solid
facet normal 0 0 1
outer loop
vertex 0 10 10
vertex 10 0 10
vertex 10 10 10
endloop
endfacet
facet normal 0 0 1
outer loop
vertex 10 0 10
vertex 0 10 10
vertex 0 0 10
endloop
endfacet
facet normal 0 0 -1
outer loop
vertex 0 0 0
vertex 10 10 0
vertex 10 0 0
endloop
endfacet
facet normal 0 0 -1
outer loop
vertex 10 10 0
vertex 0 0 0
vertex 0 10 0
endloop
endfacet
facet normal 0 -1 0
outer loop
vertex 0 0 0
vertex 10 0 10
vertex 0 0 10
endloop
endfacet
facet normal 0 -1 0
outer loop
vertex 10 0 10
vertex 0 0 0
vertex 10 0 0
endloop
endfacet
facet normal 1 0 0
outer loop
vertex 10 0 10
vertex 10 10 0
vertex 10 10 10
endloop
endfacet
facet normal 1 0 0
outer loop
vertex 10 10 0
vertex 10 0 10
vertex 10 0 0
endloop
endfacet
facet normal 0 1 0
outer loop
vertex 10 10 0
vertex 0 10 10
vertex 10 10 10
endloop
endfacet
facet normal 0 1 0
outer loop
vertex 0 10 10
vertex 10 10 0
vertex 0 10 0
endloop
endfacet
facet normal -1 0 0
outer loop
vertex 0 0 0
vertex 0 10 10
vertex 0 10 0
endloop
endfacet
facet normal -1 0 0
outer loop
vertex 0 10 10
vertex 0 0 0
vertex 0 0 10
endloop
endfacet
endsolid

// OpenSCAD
// file: ../Household/references.scad
// Size
//Naming
// _PT = printable
// _ES = exact size
// _IS = insertable with force but no gaps

//--------------cables  (CB)

//----Ethernet (rj45)

//not mesured yet
CB_RJ45_Diameter_ES=4; 

//--------------threaded rod  (TR)

//----M5

TR_M5_Diameter_ES = 5.8;
//for a hole 
TR_M5_Diamater_IS = 6;
TR_M5_Diamater_PT = 7;


//----M10

TR_M10_Diameter_ES = 9.6;
//for a hole 
TR_M10_Diamater_IS = 10;
TR_M10_Diamater_PT = 12;

//--------------Screw (SC)
//----M3

module body_M3(height_input){
    cylinder(d=SC_M3_Diameter_PT,h=height_input,$fn=60);
    
    }

module body_M5(height_input){
    cylinder(d=SC_M5_Diameter_PT,h=height_input,$fn=60);
    
    }
    
SC_M3_Diameter_ES = 2.96;
SC_M3_Head_Diameter_ES = 5.90;
SC_M3_Head_Height_ES = 2.32;
//for a hole 
SC_M3_Diameter_PT = 4; 


//----M5

SC_M5_Diameter_ES = 4.86;
SC_M5_Head_Diameter_ES = 9.24;
SC_M5_Head_Height_ES = 3.0;
//for a hole 
SC_M5_Diameter_IS = 5;
SC_M5_Diameter_PT = 5.2; //inconnu pour le moment
SC_M5_Head_Diameter_PT = 11;

//--------------Nut Bolt (NB)

module nut_M3(height_input){
    cylinder(d=NB_M3_Diameter_C2C_PT,h=height_input,$fn=6);
    
    }

//----M3
// Side to side = from 2 paralelle faces S2S
// corner to corner = from 2 corners C2C


NB_M3_Diameter_S2S_ES = 5.30;
NB_M3_Diameter_C2C_ES = 6.0;

NB_M3_Diameter_S2S_PT = 6.30; //reducing as well
NB_M3_Diameter_C2C_PT = 7.0; //8.0 was too much 


//--------------Zip ties (ZT)

//Big zip ties I got    

ZT_length_ES = 300;
ZT_width_ES = 4.8;
ZT_height_ES = 1;

ZT_width_PT = 7;
ZT_height_PT = 3;

//--------------Velcro tape (VT)



VT_length_ES = 300;
VT_width_ES = 20;
VT_height_ES = 1;

VT_width_PT = 22;
VT_height_PT = 3;



//--------------Switch (SW)
//switch from castorama 
SW_length_ES = 13;
SW_width_ES = 8;
SW_height_ES = 14;

SW_length_PT = 15;
SW_width_PT = 10;
SW_height_PT = 16;


//switch from aliexpress
SW_AL_tube_width_ES = 5.7;
SW_AL_tube_width_PT = 7;

module custom_cylinder_switch(translated_position_X, translated_position_Y,translated_position_Z,heigh_input) {
    translate([translated_position_X, translated_position_Y, translated_position_Z]){ 
        rotate([90,0,0]){
            cylinder(d=SW_AL_tube_width_PT, h=heigh_input, $fn=30);
        }
    }
}
module custom_cylinder(rotate_input,translate_input,diameter_object,height_object){
    translate(translate_input){
        rotate(rotate_input){
            cylinder(d=diameter_object,h=height_object,$fn=60);
        }
    }
}

//--------------generic connectors (GC)
// USB C (USB-C)
GC_USB_C_length_ES = 7.3;
GC_USB_C_width_ES = 8.8;
GC_USB_C_height_ES = 3;

module USB_C(rotate_input,translate_input){
    translate(translate_input){
    rotate(rotate_input){
        hull(){
    cylinder(d=GC_USB_C_height_ES,h=GC_USB_C_length_ES,$fn=60);
translate([0,GC_USB_C_width_ES-GC_USB_C_height_ES,0]){
    cylinder(d=GC_USB_C_height_ES,h=GC_USB_C_length_ES,$fn=60);
}
}
    }
}
}

//--------------battery from vapes (BV)

//vapes crystal pro battery (CP)
BV_CP_length_ES = 34;
BV_CP_width_ES = 20;
BV_CP_height_ES = BV_CP_width_ES; //(because it's a cylinder)

BV_CP_length_PT = 37;
BV_CP_width_PT = 22;
BV_CP_height_PT = BV_CP_width_ES; //(because it's a cylinder)

//dimension list [legnth, width, height]
//BV_CP_PT=[37,22,22];
BV_CP_PT=[BV_CP_length_PT,BV_CP_width_PT,BV_CP_height_PT];

module vapes_battery(input_list,rotate_input,translate_input){
translate(translate_input){
    rotate(rotate_input){
        color("green")cylinder(d=input_list[1],h=input_list[0],$fn=60);
    }
    }
}


//--------------battery charger (BC)
//Board Charger TP4056 Module  (TP)

//https://www.az-delivery.uk/cdn/shop/products/tp4056-batterieladungsmodul-usb-typ-c-schutzschaltung-led-anzeigen-fur-ihre-li-ion-oder-lipo-einzelzellenbatterien-126337.jpg?v=1694708173


BC_TP_length_ES = 28;
BC_TP_full_length_ES = 28; //usb C end included
BC_TP_width_ES = 17;
BC_TP_height_ES = 1.3; //without USB C
BC_TP_full_height_ES = 5; //with USB C



//usb C connector position
BC_TP_width_from_side_ES = 8.44;//center of USB C connector from bottom (view from the top )
BC_TP_height_from_bottom_ES = 3.4;//center of USB C connector from bottom (view from the top )
BC_TP_negative_length_ES = 2;//center of USB C connector from bottom 

module battery_charger(rotate_input,translate_input){
    translate(translate_input){
    rotate(rotate_input){
        color("green"){
            cube([BC_TP_full_length_ES,BC_TP_width_ES,BC_TP_height_ES]);

                rotate_array_USB_C=[0,90,0];
    translate_array_USB_C=[-BC_TP_negative_length_ES,BC_TP_width_ES/2-(GC_USB_C_width_ES-GC_USB_C_height_ES)/2,GC_USB_C_height_ES/2+BC_TP_height_ES];
    
    USB_C(rotate_array_USB_C,translate_array_USB_C);

            
            }
    }
}
    
    }


//https://www.alectrofag.co.uk/cdn/shop/files/Hayati_Pro_Max_4000_Puffs_Disposable_Vape.jpg?v=1725012272




//https://d138zd1ktt9iqe.cloudfront.net/media/seo_landing_files/length-width-height-01-1646654708.png
// main file
include <../Household/references.scad>

// Define variables for the dimensions and hole positions in millimeters

//main
wall_thickness = 3;


//head
length_object = 18.4;   //X
width_object = 28;    //Y
height_object = 46.5;  //Z



length_perimeter = length_object + (wall_thickness*2);
width_perimeter = width_object +(wall_thickness*2);
height_perimeter = height_object +(wall_thickness*2);


module hole_for_lamp(length_parametric,width_parametric,height_parametric){
radius_circles_corner_parametric = (width_parametric/4);
    hull(){
        translate([0,(width_parametric/2)-radius_circles_corner_parametric,(height_parametric/2)-radius_circles_corner_parametric]){
            rotate([0,90,0]){
                color("green")cylinder(h=length_parametric, d=width_parametric/2 , $fn=100);
            }
        }
        translate([0,-(width_parametric/2)+radius_circles_corner_parametric,(height_parametric/2)-radius_circles_corner_parametric]){
            rotate([0,90,0]){
                color("green")cylinder(h=length_parametric, d=width_parametric/2 , $fn=100);
            }
        }
        translate([0,(width_parametric/2)-radius_circles_corner_parametric,-(height_parametric/2)+radius_circles_corner_parametric]){
            rotate([0,90,0]){
                color("green")cylinder(h=length_parametric, d=width_parametric/2 , $fn=100);
            }
        }
        translate([0,-(width_parametric/2)+radius_circles_corner_parametric,-(height_parametric/2)+radius_circles_corner_parametric]){
            rotate([0,90,0]){
                color("green")cylinder(h=length_parametric, d=width_parametric/2 , $fn=100);
            }
        }
    }
                rotate_array_battery_charger=[90,90,0];
    translate_array_battery_charger=[0,width_object/2-3,height_object/2-1.5];
    scale([1.12,1.12,1.12]){
        battery_charger(rotate_array_battery_charger,translate_array_battery_charger);
    }


}

cube([10,10,10]);


  
